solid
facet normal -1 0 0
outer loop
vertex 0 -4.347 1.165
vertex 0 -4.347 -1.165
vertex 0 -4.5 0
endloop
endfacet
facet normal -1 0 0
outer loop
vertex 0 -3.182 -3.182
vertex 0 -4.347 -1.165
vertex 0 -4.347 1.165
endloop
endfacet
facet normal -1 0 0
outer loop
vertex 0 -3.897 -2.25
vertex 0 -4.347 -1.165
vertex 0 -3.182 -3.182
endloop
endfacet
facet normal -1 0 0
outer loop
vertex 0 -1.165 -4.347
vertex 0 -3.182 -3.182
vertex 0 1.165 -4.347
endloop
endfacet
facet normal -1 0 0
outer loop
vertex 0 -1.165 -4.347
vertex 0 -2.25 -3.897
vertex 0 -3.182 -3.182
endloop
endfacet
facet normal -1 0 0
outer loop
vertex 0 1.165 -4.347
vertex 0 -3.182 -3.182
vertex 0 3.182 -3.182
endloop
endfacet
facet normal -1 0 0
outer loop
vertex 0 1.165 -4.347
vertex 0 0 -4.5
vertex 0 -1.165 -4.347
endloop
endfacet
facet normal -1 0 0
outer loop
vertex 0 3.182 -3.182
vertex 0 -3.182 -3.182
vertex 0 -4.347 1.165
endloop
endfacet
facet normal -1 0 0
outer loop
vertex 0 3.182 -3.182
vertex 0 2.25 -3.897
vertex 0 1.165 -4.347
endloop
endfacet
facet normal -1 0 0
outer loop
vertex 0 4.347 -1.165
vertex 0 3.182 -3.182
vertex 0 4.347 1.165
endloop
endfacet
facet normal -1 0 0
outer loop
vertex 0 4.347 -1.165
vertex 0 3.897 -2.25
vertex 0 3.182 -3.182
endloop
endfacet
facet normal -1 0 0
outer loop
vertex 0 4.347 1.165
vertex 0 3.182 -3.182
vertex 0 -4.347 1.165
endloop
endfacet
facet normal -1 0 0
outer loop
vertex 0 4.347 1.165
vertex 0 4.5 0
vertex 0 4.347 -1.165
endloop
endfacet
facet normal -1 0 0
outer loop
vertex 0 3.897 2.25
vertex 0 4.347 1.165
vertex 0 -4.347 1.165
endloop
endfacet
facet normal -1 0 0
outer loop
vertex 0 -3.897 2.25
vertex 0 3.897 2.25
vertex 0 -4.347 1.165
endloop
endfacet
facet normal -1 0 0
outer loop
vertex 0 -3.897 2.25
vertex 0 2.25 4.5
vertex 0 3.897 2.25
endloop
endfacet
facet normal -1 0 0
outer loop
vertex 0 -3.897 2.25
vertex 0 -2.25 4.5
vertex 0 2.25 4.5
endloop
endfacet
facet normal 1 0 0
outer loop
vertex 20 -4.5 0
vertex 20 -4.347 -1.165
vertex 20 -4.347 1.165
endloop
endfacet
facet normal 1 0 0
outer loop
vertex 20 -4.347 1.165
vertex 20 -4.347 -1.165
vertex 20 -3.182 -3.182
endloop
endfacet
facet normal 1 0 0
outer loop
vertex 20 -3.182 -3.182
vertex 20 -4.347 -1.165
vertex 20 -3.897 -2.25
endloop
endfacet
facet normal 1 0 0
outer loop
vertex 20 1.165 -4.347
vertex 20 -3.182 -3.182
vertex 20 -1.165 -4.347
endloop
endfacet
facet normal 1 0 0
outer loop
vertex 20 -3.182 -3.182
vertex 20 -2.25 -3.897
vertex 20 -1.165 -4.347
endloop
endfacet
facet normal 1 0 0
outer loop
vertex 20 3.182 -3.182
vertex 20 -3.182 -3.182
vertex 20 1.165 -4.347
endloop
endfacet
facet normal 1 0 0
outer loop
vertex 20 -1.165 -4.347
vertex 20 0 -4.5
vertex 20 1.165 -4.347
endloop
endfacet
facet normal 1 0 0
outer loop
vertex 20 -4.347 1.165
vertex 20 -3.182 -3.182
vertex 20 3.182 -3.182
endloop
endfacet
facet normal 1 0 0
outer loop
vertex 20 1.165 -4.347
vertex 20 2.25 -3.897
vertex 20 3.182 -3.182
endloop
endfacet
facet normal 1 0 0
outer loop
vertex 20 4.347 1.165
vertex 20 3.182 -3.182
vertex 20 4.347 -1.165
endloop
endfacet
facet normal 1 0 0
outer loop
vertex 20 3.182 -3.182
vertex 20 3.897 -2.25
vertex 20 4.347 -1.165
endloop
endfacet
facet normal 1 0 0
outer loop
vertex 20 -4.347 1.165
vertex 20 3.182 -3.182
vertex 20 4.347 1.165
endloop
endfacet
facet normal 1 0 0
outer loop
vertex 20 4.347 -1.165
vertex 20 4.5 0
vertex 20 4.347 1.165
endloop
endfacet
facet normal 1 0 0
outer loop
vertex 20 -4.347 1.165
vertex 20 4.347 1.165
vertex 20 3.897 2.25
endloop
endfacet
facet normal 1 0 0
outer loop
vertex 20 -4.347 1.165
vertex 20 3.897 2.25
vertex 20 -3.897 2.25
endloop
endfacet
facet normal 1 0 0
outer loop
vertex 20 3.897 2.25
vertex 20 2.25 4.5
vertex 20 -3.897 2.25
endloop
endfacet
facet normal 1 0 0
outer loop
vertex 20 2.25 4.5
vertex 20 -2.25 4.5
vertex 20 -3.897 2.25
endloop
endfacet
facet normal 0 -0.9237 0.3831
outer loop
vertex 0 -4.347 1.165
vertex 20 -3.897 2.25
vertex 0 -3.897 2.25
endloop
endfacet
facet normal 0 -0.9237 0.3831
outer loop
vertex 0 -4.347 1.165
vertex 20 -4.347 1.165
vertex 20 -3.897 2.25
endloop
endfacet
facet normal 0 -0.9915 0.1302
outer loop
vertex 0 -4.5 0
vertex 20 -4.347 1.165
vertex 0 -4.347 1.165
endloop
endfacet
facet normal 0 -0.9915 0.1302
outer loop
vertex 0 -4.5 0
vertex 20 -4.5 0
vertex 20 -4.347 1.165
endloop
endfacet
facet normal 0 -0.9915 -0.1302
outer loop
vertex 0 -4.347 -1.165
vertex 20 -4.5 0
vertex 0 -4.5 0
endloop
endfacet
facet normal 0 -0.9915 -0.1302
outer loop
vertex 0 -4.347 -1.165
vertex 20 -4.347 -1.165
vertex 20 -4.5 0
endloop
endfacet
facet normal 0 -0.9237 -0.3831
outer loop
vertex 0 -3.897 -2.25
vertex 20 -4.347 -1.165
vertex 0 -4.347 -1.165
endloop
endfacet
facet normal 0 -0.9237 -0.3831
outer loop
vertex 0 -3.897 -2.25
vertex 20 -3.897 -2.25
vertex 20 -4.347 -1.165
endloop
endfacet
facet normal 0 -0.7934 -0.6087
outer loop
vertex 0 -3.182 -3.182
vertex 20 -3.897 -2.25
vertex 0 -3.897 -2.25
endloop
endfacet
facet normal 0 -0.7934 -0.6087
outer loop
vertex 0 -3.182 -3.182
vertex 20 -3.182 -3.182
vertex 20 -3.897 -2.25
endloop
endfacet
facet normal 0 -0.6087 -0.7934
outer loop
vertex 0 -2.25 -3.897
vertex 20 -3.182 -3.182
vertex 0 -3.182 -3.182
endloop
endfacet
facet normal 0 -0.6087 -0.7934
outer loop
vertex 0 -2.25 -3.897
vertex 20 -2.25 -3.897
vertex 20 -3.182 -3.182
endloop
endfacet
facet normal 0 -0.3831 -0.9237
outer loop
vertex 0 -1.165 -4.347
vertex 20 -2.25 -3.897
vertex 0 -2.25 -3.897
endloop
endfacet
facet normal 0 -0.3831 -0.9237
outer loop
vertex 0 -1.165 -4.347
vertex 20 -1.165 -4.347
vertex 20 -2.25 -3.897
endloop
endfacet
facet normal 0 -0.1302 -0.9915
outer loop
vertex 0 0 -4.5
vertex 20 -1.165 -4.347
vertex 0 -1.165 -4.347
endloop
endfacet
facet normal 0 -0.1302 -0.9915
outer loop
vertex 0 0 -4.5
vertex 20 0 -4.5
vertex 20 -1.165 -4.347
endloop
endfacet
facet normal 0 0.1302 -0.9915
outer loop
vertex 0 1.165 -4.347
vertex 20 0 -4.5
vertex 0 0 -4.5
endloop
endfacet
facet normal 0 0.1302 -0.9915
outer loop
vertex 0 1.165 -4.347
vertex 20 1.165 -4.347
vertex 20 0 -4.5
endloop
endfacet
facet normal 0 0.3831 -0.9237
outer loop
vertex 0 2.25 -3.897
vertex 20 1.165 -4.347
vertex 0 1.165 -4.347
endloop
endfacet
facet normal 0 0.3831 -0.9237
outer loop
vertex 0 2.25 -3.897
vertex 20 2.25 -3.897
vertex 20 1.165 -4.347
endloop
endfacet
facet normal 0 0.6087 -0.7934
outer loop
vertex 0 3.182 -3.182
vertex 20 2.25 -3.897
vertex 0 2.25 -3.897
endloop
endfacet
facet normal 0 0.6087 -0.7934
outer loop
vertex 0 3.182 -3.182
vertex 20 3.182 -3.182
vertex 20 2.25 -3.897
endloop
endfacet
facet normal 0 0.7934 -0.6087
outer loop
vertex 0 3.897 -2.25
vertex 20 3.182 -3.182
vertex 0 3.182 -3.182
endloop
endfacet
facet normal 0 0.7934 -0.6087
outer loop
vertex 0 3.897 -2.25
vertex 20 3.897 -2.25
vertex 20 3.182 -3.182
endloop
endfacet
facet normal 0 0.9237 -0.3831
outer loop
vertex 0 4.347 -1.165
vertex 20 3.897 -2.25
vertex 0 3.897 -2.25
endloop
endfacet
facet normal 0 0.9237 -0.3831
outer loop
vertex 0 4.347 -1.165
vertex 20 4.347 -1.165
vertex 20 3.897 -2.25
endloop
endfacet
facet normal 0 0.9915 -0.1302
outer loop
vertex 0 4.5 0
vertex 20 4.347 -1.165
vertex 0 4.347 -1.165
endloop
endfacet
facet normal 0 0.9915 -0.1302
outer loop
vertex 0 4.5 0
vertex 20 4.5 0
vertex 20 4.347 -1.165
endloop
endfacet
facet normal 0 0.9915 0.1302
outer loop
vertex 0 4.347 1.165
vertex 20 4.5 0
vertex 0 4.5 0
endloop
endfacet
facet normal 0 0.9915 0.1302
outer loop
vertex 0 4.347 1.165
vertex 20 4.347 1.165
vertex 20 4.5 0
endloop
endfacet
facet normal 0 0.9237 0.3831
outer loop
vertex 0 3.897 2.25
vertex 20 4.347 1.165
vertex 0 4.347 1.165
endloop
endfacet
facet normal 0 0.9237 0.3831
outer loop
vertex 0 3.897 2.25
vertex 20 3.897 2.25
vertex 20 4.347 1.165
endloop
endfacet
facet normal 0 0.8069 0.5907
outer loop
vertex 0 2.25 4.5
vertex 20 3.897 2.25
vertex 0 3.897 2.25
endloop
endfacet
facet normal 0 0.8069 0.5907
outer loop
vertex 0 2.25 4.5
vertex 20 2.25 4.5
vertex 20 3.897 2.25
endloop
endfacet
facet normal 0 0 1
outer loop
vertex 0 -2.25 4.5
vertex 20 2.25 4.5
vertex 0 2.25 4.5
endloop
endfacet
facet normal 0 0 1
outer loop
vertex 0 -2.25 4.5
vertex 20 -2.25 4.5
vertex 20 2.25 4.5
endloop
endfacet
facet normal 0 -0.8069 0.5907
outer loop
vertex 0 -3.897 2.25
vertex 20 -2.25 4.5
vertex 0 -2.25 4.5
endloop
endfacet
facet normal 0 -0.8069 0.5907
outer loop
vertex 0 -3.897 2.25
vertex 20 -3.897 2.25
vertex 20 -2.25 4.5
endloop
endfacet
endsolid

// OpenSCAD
teardrop();

module teardrop (r=4.5,h=20)
{
	rotate([-270,0,90])
	linear_extrude(height=h)
	{
		circle(r=r, $fn = 24);
		polygon(points=[[0,0],[r*cos(30),r*sin(30)],[0.5*r,r],[-0.5*r,r],[-r*cos(30),r*sin(30)]],
				paths=[[0,1,2,3,4]]);
	}
}

module teardropcentering (r=4.5,h=20)
{
	rotate([-270,0,90])
	linear_extrude(height=h)
	{
		circle(r=r, $fn = 24);
		polygon(points=[[0,0],[r*cos(30),r*sin(30)],[0.5*r,1.2*r],[-0.5*r,1.2*r],[-r*cos(30),r*sin(30)]],
				paths=[[0,1,2,3,4]]);
	}
}

module teardropcentering2 (r=4.5,h=20)
{
	//rotate([-270,0,90])
	difference(){
	linear_extrude(height=h)
	{
		circle(r=r, $fn = 24);
		polygon(points=[[0,0],[r*cos(30),r*sin(30)],[0.5*r,1.2*r],[-0.5*r,1.2*r],[-r*cos(30),r*sin(30)]],
				paths=[[0,1,2,3,4]]);
	}
	translate(v = [-1.5*r, -1.5*r,-1])cube(size =[3*r,1.5*r,h+2]);
	}
}
